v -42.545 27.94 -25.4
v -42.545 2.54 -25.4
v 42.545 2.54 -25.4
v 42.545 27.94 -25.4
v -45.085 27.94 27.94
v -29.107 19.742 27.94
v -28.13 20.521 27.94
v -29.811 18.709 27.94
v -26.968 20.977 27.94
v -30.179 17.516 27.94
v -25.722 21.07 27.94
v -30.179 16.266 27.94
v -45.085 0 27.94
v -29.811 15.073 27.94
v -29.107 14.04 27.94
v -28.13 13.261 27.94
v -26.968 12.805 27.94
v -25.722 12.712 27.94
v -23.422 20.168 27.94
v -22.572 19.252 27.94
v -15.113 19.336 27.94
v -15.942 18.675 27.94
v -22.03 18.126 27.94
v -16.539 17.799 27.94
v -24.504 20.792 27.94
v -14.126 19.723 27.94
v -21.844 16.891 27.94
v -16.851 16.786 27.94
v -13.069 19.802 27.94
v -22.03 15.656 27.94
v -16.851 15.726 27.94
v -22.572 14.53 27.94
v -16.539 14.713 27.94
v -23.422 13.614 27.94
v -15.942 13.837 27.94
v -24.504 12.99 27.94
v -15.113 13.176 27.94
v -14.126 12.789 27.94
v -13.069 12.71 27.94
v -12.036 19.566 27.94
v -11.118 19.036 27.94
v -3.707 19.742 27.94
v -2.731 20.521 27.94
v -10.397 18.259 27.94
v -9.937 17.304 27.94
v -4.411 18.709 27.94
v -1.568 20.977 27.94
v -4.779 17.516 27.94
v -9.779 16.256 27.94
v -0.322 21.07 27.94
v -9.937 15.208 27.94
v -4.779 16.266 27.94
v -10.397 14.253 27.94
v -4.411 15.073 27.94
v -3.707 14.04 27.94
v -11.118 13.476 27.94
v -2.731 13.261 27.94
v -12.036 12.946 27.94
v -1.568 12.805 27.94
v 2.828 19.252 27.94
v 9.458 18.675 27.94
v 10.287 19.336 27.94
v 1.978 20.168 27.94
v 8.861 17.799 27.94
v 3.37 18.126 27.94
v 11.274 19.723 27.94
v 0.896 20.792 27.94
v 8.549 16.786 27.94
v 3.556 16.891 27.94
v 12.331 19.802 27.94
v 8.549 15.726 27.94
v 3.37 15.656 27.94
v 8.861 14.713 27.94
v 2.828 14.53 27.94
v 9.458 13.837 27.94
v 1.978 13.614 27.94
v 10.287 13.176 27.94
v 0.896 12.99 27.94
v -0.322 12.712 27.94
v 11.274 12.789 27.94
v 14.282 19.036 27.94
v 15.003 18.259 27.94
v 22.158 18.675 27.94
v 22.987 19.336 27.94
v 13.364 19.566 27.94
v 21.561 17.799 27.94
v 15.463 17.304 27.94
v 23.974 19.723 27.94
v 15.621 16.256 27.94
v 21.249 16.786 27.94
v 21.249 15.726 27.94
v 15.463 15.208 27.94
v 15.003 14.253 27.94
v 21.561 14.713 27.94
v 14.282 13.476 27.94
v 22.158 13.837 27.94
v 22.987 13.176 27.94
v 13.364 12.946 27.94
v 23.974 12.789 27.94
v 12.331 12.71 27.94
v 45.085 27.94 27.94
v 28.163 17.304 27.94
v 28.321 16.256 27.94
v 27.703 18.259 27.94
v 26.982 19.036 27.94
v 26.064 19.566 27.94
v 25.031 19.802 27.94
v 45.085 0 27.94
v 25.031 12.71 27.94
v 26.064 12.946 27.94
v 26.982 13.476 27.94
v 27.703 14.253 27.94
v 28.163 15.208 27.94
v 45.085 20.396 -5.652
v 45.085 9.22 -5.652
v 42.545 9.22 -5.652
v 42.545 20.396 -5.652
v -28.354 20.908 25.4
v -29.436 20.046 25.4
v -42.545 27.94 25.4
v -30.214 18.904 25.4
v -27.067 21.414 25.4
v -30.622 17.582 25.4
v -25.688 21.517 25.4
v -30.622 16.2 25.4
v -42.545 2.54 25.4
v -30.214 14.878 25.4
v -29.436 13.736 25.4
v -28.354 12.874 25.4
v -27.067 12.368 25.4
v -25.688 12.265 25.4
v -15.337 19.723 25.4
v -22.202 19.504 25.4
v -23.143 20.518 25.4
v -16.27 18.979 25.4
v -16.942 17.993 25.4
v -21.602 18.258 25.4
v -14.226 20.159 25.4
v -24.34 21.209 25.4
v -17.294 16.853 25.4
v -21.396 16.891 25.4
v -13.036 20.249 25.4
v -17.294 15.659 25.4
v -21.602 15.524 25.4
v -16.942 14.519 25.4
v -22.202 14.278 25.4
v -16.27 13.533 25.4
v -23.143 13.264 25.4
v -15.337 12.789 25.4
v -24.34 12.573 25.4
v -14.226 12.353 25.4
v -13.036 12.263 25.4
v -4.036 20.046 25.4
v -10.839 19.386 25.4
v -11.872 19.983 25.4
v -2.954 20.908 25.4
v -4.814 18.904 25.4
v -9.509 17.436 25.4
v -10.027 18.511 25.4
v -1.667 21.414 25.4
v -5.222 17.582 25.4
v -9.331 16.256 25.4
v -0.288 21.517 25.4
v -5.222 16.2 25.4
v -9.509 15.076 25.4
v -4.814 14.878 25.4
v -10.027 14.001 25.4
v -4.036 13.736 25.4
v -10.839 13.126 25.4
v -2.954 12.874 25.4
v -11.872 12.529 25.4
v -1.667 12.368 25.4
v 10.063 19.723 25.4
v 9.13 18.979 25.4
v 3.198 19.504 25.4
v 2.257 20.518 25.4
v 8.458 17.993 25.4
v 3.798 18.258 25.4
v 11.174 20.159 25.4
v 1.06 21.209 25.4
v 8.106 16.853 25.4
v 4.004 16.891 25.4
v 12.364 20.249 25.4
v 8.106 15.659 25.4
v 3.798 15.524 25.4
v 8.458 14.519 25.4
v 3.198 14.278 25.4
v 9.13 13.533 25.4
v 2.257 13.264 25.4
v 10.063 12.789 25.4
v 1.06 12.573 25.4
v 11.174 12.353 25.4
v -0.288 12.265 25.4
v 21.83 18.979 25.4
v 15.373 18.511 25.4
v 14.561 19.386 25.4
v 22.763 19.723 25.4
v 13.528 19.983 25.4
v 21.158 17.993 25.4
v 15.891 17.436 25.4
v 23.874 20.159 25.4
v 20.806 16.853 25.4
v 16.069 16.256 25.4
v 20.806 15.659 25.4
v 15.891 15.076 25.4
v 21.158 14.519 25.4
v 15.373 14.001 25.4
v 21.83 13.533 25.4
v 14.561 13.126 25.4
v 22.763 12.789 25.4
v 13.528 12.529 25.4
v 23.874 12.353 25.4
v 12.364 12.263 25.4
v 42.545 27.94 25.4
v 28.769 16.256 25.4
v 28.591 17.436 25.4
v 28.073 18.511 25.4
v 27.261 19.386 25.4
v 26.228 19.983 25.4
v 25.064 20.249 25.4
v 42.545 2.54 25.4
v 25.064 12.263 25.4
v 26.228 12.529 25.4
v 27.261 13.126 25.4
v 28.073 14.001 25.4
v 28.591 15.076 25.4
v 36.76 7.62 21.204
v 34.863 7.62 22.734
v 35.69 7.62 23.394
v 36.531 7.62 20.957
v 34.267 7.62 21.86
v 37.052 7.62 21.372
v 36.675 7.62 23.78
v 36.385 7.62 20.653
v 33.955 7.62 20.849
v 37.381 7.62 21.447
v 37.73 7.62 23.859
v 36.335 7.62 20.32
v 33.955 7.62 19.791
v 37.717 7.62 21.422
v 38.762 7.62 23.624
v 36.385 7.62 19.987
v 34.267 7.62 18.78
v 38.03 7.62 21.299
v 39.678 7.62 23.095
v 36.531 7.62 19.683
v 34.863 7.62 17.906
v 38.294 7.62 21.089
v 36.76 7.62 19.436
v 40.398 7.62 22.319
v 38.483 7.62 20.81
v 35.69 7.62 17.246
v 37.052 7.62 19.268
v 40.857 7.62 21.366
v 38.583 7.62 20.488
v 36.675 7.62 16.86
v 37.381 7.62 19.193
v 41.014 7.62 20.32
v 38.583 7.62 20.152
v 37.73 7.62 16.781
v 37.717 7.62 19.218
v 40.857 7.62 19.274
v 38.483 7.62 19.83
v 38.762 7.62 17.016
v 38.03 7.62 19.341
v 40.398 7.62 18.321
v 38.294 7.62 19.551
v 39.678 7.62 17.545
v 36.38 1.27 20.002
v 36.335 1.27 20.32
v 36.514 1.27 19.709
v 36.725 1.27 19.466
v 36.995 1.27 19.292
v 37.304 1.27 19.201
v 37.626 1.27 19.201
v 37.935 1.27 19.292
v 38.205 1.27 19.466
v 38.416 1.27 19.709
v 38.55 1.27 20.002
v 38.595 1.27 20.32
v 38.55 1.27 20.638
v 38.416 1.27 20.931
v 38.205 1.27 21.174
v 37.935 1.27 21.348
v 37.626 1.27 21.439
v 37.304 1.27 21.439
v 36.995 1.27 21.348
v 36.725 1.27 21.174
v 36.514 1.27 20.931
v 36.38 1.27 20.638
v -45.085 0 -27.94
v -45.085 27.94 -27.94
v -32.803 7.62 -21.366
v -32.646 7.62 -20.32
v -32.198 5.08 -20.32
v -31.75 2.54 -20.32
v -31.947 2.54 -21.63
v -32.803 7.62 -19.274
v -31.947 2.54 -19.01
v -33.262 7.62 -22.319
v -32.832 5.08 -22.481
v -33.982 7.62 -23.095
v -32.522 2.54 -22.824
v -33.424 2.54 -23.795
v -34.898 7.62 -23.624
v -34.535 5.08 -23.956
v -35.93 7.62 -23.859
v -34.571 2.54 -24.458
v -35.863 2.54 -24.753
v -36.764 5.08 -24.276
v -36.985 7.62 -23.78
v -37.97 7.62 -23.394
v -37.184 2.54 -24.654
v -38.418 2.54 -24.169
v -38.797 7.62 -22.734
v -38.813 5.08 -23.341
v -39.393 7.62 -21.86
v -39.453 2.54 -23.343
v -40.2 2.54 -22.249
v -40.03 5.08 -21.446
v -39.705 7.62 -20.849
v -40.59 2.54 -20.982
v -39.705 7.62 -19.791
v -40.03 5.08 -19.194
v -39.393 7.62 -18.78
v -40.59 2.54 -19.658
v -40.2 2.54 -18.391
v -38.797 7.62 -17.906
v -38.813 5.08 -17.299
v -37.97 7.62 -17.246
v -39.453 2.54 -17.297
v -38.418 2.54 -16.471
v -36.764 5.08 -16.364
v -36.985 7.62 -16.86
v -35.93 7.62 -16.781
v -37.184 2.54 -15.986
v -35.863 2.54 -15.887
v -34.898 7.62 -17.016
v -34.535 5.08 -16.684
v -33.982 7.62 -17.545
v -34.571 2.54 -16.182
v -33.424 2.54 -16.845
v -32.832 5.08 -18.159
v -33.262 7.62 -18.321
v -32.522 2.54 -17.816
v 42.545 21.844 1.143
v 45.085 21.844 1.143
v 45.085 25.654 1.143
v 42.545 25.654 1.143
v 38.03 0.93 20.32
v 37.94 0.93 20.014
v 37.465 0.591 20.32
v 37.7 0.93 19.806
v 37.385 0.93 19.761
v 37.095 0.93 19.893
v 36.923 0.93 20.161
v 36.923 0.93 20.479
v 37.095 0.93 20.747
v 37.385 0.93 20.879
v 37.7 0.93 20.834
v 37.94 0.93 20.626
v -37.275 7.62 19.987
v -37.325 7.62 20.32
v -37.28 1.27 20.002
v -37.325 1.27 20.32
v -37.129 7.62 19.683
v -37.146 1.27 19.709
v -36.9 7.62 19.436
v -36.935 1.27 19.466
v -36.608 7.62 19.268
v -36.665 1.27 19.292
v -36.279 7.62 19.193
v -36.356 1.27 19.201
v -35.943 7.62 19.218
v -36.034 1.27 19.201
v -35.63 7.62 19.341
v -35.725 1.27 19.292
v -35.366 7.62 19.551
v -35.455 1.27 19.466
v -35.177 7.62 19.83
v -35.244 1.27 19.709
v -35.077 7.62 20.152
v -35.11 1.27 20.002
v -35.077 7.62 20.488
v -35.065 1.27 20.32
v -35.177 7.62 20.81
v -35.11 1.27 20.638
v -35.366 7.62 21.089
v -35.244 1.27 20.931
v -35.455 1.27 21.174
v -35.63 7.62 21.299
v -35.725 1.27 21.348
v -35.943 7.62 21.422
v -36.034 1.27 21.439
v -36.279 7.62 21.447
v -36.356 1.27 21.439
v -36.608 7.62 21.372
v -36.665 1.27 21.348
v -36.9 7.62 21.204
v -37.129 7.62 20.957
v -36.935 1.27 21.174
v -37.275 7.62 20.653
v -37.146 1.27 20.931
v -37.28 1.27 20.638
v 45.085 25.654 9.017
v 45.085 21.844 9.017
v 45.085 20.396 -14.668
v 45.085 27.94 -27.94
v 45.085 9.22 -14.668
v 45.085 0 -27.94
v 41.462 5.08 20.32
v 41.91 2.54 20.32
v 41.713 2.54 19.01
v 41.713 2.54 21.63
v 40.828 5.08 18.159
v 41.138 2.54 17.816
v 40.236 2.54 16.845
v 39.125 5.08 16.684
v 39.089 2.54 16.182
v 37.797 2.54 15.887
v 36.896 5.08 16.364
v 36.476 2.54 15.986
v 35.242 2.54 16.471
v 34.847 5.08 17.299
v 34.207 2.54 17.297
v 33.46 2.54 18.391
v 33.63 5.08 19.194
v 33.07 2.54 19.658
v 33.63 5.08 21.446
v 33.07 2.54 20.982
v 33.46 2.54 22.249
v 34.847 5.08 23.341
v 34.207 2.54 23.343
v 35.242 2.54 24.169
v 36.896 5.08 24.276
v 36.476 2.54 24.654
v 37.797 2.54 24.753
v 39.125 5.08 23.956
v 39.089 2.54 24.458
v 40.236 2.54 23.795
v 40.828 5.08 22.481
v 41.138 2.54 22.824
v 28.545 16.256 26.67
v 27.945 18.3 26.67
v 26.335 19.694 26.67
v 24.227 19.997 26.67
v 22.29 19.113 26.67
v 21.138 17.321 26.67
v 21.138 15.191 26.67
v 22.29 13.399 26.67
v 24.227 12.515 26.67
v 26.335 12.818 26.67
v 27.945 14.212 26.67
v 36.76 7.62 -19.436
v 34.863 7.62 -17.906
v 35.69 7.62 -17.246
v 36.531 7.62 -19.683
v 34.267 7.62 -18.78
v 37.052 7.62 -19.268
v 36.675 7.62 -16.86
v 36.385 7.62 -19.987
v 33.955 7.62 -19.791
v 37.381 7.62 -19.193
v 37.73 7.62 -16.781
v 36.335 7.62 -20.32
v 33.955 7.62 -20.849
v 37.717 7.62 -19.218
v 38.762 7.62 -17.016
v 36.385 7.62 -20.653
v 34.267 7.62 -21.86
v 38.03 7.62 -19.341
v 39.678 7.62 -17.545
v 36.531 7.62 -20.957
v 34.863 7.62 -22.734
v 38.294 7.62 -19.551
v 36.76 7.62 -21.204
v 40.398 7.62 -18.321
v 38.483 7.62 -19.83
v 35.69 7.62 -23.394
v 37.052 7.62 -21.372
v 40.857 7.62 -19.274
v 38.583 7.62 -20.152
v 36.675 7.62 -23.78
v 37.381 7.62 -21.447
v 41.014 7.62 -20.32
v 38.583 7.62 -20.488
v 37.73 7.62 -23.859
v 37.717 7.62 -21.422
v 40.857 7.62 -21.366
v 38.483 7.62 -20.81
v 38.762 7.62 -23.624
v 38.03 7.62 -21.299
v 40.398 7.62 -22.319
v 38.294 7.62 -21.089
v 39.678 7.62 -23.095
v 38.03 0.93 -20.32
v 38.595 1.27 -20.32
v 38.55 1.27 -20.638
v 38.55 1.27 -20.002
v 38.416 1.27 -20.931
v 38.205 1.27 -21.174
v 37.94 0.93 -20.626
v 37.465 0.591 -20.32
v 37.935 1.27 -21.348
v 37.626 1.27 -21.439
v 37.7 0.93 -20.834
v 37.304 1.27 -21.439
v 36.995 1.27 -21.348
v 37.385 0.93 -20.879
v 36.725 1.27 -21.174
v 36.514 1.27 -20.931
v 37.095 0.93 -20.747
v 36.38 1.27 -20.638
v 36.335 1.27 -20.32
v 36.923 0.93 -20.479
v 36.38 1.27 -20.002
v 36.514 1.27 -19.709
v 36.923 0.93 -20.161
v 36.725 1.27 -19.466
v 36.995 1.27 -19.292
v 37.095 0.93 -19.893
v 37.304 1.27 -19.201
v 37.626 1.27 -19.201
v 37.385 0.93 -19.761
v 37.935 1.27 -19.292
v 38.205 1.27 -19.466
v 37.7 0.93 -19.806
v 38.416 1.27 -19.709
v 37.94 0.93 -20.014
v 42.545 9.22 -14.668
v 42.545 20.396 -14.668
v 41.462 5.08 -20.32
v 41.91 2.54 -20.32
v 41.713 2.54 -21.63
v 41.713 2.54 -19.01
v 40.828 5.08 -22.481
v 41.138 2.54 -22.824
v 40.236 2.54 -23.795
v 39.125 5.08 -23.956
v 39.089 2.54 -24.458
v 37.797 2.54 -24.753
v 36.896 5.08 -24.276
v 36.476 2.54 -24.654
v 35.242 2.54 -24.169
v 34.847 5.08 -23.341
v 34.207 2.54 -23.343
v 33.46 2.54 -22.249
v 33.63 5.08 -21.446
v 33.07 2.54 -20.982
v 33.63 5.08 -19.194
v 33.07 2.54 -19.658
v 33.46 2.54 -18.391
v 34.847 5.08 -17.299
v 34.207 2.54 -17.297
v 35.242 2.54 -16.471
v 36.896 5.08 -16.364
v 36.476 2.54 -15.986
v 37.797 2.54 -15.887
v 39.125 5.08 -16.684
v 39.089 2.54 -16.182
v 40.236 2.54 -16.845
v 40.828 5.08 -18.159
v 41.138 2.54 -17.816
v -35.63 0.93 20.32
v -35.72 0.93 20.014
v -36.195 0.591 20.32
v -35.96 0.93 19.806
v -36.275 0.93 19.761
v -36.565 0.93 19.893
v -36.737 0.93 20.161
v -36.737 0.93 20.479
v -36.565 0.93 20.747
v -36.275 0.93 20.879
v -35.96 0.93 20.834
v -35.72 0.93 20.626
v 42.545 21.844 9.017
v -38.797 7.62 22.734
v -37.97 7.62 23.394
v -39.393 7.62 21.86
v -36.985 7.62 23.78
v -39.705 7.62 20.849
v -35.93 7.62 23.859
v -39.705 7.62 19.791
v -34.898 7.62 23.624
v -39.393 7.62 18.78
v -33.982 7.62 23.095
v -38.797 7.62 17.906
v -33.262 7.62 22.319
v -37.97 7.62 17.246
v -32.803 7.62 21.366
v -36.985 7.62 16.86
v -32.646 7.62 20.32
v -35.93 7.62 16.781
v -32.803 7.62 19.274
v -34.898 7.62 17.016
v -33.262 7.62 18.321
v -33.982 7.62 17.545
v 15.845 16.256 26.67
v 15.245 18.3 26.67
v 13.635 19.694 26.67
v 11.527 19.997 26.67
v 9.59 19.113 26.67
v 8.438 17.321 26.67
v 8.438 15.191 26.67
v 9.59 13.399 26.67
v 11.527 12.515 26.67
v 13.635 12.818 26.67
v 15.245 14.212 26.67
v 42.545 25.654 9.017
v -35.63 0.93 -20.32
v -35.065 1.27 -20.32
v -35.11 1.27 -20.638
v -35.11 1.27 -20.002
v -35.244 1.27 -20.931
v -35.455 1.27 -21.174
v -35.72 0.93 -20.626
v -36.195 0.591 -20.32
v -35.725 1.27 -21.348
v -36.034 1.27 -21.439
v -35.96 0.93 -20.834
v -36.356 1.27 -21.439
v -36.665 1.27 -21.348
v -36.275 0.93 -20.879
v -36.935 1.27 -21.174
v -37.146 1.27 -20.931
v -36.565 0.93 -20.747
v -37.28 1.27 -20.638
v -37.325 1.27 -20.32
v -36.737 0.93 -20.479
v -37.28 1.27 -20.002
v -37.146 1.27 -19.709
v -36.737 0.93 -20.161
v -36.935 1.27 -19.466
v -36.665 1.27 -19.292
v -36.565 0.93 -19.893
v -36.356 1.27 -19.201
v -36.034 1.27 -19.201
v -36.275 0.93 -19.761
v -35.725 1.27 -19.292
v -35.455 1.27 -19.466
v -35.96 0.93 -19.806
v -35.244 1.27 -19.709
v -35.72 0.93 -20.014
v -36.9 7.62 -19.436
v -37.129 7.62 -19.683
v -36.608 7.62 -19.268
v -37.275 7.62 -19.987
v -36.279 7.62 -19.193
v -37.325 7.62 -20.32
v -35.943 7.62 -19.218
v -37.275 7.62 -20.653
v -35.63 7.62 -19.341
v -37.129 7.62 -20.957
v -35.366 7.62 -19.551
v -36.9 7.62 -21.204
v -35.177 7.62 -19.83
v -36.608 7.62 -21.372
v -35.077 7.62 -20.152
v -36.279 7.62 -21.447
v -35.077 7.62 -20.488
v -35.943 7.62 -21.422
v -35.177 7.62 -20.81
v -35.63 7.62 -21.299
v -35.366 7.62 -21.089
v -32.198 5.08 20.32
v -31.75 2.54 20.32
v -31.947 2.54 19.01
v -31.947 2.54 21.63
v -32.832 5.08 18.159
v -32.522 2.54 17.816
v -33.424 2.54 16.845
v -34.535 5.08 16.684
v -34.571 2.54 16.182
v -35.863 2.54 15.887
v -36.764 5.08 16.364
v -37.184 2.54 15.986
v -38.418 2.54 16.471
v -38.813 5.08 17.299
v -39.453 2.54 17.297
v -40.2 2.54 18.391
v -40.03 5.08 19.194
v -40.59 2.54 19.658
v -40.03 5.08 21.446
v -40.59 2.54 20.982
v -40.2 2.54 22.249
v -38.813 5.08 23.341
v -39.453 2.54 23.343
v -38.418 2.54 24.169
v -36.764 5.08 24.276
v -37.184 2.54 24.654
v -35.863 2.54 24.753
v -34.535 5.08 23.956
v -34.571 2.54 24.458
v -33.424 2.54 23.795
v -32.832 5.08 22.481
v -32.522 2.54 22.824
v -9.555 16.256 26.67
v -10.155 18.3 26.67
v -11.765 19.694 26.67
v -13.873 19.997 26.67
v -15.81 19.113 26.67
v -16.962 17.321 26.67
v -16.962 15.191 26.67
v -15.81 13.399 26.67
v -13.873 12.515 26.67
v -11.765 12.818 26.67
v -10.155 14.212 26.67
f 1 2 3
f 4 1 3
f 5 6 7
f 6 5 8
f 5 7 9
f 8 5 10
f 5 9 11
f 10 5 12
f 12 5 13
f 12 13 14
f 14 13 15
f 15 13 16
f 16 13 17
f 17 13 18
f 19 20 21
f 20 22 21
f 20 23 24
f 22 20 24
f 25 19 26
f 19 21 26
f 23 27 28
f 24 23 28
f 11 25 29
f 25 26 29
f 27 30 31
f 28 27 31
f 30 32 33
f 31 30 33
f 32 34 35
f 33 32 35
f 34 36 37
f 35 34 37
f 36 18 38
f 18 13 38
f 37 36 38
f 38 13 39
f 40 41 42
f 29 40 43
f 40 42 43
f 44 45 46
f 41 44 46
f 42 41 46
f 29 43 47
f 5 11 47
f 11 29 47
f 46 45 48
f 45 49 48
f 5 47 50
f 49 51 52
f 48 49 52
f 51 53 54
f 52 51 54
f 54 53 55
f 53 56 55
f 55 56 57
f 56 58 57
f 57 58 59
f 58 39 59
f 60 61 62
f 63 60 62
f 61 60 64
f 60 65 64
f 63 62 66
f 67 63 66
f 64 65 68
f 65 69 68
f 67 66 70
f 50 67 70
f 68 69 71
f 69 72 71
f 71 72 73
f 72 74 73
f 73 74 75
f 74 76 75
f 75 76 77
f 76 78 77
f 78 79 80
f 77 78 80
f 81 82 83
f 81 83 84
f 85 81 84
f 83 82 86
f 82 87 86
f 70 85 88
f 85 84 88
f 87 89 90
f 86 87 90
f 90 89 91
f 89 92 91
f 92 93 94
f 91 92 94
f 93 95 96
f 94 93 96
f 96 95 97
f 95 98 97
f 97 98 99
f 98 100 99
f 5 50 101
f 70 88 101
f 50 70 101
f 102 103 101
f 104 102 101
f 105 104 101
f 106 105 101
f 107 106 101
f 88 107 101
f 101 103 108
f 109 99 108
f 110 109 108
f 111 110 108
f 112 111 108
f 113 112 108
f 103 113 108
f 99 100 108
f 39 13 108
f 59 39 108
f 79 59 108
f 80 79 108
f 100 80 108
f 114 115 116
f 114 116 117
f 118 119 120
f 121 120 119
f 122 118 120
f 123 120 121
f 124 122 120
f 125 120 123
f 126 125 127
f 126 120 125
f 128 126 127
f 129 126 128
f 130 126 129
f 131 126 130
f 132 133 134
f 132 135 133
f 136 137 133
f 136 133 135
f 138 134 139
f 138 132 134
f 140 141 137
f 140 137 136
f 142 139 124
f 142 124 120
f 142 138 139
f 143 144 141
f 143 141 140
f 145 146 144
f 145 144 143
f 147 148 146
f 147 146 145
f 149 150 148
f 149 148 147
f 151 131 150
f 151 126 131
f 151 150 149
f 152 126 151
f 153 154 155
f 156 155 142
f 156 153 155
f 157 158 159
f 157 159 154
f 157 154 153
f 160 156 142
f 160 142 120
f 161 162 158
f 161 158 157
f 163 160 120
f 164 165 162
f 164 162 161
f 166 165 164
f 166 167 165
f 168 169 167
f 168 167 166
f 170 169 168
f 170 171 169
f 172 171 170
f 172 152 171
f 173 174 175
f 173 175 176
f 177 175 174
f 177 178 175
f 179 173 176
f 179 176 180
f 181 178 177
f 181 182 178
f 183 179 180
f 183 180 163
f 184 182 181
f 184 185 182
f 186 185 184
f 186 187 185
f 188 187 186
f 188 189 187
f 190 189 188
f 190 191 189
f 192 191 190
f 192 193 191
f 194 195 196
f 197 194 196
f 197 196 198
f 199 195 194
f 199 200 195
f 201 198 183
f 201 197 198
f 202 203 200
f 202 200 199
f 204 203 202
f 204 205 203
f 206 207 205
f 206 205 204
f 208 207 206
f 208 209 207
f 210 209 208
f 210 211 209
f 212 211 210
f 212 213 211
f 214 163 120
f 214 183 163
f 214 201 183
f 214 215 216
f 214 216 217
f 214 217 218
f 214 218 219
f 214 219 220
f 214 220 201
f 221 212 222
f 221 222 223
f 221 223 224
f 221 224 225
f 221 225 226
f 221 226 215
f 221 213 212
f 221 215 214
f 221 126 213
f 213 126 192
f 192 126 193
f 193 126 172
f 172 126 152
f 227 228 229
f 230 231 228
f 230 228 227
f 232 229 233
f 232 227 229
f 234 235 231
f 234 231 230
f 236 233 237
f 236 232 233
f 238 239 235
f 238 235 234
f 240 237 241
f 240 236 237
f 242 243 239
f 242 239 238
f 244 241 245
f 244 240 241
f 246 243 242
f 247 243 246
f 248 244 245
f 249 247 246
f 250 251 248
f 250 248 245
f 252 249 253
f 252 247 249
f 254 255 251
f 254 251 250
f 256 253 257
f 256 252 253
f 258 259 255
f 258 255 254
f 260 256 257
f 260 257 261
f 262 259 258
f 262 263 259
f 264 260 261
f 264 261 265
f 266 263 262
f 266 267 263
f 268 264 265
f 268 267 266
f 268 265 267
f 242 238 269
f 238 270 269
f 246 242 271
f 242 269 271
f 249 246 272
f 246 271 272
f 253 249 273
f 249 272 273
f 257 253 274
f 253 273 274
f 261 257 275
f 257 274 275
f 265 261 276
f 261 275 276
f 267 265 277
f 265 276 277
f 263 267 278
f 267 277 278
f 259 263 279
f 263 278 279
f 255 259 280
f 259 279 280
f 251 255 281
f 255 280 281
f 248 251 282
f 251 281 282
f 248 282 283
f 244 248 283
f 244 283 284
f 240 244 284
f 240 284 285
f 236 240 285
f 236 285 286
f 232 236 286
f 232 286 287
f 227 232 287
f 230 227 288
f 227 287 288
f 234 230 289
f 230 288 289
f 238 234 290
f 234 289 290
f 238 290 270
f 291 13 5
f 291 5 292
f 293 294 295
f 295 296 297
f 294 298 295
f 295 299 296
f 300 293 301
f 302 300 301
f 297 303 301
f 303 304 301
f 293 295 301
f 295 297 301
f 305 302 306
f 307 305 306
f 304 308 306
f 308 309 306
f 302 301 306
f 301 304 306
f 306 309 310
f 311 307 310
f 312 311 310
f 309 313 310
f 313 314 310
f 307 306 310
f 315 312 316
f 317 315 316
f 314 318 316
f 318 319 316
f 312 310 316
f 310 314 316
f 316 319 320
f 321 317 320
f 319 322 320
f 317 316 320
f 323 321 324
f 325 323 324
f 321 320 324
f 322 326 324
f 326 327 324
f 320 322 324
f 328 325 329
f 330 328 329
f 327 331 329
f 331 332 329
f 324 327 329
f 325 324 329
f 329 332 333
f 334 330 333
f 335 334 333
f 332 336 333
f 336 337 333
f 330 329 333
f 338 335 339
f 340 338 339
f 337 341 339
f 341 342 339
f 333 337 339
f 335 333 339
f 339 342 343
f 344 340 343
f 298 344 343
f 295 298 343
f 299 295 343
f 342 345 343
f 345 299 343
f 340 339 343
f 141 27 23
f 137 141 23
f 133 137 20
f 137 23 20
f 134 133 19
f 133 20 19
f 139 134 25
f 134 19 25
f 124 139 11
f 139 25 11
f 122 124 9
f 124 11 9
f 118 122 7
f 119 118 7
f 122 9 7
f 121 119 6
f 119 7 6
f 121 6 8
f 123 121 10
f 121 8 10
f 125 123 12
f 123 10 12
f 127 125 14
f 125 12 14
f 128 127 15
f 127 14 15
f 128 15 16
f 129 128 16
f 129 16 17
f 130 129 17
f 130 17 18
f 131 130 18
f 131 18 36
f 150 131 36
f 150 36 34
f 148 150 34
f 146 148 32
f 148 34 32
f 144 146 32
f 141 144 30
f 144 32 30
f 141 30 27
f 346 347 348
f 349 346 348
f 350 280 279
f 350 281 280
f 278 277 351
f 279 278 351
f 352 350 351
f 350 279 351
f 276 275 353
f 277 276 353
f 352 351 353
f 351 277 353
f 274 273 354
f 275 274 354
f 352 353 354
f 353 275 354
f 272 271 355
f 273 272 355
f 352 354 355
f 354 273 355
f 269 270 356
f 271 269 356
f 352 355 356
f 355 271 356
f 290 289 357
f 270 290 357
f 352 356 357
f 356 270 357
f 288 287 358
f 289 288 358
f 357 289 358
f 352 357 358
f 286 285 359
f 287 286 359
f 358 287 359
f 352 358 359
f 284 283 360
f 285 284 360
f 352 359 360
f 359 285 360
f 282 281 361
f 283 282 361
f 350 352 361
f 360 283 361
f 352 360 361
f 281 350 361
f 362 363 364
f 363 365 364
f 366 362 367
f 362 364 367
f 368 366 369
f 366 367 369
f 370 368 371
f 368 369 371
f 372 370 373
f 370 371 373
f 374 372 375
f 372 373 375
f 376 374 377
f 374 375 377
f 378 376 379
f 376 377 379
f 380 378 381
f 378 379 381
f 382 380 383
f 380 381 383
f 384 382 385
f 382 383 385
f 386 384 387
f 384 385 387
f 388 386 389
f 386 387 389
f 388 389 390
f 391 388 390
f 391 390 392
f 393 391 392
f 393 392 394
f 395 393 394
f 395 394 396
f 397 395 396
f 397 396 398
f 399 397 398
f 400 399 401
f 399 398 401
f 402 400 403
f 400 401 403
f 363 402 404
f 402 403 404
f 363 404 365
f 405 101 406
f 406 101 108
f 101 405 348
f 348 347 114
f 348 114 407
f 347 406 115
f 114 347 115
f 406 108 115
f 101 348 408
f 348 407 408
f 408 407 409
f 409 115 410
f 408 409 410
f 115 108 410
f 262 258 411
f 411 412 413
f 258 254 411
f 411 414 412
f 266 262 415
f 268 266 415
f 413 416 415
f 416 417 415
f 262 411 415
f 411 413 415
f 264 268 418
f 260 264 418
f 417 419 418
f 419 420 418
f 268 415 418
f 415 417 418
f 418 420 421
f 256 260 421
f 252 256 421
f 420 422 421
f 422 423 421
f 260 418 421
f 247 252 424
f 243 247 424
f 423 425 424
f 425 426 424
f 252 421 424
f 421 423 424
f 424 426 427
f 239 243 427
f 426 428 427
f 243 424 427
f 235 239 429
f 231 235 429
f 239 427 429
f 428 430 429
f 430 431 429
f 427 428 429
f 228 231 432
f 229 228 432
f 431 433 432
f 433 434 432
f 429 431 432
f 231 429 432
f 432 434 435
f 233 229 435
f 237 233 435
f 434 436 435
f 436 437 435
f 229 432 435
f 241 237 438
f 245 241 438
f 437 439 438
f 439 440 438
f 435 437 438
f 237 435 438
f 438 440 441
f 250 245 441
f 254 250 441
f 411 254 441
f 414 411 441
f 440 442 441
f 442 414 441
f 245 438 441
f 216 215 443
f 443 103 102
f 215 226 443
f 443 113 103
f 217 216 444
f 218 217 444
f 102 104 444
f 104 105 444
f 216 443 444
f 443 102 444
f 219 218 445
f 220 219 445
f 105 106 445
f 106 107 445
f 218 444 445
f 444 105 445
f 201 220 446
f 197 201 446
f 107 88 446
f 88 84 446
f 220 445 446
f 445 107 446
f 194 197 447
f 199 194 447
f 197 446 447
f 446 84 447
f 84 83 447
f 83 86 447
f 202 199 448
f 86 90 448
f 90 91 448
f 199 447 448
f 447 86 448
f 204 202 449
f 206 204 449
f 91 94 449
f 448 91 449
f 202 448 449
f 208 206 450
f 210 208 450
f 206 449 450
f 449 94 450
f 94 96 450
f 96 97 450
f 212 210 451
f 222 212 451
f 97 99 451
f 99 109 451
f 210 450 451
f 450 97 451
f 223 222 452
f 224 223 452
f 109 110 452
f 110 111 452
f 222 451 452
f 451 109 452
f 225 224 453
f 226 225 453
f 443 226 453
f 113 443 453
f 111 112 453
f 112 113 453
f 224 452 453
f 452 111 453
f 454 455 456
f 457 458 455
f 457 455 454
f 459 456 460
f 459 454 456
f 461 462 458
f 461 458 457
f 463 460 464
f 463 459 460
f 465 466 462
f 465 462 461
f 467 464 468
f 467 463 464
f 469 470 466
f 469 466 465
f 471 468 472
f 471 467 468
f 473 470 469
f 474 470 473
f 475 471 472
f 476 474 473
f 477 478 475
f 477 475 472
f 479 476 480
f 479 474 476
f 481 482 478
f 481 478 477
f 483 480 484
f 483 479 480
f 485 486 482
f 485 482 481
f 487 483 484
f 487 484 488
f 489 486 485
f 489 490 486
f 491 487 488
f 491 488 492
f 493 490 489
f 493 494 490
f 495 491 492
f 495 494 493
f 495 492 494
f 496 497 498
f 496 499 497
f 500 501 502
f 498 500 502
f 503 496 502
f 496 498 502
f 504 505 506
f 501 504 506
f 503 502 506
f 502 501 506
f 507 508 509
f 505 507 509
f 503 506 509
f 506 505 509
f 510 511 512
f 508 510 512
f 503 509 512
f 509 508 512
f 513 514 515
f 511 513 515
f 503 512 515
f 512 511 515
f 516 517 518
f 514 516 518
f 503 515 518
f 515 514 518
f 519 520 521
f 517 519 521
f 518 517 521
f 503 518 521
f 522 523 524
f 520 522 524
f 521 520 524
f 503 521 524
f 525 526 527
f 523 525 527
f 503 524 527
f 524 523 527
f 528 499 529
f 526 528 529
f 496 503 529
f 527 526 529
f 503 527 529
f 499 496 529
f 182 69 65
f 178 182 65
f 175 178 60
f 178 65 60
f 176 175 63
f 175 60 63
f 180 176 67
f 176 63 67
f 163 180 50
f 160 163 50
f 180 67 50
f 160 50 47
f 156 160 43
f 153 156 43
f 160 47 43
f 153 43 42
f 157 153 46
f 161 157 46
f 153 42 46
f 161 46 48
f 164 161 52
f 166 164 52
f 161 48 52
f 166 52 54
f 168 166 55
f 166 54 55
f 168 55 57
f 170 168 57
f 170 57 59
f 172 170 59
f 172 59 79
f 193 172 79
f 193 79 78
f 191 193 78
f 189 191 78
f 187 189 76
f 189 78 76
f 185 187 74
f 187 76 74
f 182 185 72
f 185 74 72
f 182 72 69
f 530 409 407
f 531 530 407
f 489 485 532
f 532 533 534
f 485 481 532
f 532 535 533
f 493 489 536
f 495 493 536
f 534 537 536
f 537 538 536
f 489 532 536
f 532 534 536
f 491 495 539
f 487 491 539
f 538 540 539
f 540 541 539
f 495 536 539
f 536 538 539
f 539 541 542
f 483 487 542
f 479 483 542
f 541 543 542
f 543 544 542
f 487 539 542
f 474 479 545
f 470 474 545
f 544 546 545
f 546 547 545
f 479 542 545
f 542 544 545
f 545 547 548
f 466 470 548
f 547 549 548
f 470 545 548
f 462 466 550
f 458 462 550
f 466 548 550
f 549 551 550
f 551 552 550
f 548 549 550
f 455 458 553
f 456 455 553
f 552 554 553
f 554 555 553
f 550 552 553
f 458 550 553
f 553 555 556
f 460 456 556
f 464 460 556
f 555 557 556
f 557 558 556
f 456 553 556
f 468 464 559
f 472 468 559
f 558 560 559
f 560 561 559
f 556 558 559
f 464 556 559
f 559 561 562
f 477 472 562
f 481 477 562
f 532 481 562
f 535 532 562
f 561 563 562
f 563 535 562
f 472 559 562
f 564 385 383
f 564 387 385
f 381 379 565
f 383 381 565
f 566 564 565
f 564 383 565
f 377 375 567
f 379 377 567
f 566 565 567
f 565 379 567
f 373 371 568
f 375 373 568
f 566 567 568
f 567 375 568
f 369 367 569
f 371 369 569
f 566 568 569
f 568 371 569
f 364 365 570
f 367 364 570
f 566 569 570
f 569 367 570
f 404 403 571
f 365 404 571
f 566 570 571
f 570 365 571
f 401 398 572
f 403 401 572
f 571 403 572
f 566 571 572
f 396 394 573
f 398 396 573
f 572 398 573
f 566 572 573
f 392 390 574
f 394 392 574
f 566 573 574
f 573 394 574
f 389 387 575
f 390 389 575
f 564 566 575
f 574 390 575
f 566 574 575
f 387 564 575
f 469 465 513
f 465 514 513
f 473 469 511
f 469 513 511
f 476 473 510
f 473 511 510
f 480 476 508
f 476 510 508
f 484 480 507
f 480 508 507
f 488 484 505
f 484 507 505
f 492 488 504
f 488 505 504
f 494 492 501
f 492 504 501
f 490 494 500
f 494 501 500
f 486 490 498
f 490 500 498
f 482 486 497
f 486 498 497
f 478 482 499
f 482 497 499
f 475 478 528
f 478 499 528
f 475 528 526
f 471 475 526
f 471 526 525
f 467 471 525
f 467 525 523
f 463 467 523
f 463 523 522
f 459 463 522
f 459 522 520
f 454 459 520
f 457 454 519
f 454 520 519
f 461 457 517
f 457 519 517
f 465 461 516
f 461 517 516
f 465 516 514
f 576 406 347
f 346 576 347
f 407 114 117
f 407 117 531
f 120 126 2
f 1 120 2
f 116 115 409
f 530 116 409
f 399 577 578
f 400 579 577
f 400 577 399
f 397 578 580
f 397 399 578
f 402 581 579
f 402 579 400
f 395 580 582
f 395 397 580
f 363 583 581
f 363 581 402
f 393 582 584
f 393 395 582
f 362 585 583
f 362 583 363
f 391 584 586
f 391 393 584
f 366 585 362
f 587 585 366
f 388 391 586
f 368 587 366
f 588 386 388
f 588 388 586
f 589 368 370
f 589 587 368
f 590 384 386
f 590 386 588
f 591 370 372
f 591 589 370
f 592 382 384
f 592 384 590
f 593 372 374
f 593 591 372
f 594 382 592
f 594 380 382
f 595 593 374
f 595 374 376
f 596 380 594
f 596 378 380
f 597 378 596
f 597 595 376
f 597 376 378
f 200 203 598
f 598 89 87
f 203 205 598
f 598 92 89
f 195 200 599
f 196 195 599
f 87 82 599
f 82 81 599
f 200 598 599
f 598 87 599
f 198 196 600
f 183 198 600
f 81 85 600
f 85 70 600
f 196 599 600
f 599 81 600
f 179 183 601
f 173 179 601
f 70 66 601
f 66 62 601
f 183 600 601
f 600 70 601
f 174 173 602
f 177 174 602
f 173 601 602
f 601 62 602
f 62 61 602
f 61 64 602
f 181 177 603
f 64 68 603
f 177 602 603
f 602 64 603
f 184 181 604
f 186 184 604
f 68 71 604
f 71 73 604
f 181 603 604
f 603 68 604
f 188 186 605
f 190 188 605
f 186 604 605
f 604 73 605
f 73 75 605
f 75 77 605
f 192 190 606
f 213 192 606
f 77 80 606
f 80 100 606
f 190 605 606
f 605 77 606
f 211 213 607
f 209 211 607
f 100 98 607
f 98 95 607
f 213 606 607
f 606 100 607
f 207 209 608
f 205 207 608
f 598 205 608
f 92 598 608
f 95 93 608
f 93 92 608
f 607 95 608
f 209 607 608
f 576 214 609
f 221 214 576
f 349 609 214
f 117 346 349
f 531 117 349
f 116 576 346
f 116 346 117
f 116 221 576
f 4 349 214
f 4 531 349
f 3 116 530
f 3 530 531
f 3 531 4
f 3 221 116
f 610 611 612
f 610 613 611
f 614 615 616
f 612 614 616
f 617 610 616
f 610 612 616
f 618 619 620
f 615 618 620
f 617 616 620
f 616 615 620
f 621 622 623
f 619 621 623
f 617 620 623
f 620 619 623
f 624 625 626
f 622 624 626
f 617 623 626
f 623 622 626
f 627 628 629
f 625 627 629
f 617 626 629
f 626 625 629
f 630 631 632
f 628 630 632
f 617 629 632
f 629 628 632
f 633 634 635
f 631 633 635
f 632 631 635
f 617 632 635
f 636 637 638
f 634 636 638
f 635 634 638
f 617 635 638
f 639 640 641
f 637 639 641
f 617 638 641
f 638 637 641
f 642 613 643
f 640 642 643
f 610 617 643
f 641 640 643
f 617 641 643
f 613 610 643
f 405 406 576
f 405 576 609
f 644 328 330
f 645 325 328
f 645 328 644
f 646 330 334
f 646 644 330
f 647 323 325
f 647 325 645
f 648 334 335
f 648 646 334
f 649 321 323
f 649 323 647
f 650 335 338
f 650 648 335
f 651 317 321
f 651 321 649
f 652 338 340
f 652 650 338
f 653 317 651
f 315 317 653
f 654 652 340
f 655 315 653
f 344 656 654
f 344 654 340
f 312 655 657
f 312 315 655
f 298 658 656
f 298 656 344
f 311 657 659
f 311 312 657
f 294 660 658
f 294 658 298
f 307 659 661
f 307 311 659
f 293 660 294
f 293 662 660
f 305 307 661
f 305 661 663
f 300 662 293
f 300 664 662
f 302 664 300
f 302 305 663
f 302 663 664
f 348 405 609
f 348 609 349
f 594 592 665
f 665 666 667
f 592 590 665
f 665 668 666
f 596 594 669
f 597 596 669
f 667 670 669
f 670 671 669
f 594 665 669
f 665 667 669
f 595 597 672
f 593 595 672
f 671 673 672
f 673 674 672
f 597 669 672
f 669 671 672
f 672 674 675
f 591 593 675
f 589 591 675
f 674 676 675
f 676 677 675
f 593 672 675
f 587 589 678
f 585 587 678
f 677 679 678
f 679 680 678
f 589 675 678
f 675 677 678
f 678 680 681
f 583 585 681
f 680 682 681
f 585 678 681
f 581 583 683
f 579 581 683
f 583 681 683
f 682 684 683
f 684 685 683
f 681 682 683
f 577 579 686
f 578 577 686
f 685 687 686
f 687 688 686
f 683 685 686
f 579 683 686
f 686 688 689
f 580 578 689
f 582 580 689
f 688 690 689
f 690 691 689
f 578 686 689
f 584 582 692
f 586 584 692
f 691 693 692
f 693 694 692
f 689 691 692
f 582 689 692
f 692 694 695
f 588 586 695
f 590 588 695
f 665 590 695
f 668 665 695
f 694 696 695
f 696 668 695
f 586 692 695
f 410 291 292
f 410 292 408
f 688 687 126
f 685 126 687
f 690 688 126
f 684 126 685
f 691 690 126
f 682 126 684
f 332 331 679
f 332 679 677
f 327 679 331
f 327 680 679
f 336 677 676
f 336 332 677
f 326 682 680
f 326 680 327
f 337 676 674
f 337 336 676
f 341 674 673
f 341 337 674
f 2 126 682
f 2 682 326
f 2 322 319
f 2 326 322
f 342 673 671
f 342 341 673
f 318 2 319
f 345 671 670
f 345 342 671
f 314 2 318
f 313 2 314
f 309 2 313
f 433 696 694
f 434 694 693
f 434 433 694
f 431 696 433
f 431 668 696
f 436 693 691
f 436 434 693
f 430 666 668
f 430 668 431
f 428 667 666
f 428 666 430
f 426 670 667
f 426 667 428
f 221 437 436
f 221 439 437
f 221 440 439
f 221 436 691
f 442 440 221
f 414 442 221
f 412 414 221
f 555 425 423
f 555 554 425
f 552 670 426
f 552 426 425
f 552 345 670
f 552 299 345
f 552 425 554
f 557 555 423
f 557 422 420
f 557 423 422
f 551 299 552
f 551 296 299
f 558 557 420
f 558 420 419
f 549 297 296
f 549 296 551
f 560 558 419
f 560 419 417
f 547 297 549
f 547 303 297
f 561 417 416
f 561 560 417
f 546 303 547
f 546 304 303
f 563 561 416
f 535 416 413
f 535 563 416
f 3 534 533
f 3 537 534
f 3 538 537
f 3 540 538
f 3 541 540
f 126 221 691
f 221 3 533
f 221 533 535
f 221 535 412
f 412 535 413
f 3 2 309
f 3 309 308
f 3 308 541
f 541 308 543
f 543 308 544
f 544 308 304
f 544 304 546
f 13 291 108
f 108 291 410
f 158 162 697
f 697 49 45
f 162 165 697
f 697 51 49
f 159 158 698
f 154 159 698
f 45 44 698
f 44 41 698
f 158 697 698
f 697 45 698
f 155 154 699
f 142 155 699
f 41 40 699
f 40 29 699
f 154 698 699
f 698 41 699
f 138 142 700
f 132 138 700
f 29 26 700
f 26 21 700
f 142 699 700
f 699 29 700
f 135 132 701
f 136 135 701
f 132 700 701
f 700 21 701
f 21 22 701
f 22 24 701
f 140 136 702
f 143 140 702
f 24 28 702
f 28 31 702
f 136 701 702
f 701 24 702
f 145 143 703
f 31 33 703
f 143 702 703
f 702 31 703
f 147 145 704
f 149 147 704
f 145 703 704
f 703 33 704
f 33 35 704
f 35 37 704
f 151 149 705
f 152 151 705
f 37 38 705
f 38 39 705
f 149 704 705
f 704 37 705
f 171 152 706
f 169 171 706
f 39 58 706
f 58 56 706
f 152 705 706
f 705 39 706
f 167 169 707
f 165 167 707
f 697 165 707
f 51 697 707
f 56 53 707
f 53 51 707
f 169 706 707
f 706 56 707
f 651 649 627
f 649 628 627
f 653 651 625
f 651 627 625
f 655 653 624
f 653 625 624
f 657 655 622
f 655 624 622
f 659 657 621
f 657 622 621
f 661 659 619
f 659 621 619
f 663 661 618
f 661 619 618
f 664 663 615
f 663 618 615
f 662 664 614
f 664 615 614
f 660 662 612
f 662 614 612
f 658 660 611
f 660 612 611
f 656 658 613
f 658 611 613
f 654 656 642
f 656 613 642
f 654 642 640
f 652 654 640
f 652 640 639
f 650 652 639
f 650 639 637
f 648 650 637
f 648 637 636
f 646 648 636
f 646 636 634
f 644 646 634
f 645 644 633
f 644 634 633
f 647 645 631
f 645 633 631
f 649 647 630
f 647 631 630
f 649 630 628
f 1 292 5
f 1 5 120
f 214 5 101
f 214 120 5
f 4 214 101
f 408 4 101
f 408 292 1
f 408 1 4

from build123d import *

# Parameters (mm, degrees)
SKETCH1_W                     = 90.17
SKETCH1_H                     = 55.88
BOSS_EXTRUDE1_DEPTH           = 27.94
SHELL1_T                      = -2.54
SKETCH2_R                     = 4.445
BOSS_EXTRUDE4_DEPTH           = 5.08
BOSS_EXTRUDE4_DRAFT           = 10
BOSS_EXTRUDE4_PROFILE_2_DEPTH = 5.08
BOSS_EXTRUDE4_PROFILE_2_DRAFT = 10
BOSS_EXTRUDE4_PROFILE_3_DEPTH = 5.08
BOSS_EXTRUDE4_PROFILE_3_DRAFT = 10
BOSS_EXTRUDE4_PROFILE_4_DEPTH = 5.08
BOSS_EXTRUDE4_PROFILE_4_DRAFT = 10
TAP_DRILL_FOR_4_40_TAP1_D     = 2.2606
TAP_DRILL_FOR_4_40_TAP1_DEPTH = 6.35
TAP_DRILL_FOR_4_40_TAP1_TIP   = 0.679152758
SKETCH6_R                     = 3.556
CUT_EXTRUDE1_DEPTH            = 2.54
CUT_EXTRUDE1_DRAFT            = 10
CUT_EXTRUDE1_PROFILE_2_DEPTH  = 2.54
CUT_EXTRUDE1_PROFILE_2_DRAFT  = 10
CUT_EXTRUDE1_PROFILE_3_DEPTH  = 2.54
CUT_EXTRUDE1_PROFILE_3_DRAFT  = 10
SKETCH6_R_2                   = 4.191
CUT_EXTRUDE1_PROFILE_4_DEPTH  = 2.54
CUT_EXTRUDE1_PROFILE_4_DRAFT  = 10
CUT_EXTRUDE1_PROFILE_5_DEPTH  = 2.54
CUT_EXTRUDE1_PROFILE_5_DRAFT  = 10
CUT_EXTRUDE2_REACH            = 100.448
SKETCH7_W                     = 9.017
SKETCH7_H                     = 11.176
SKETCH7_W_2                   = 7.874
SKETCH7_H_2                   = 3.81


with BuildPart() as part:
    # Sketch1 → Boss-Extrude1 (new body)
    with BuildSketch(Plane(origin=(0, 0, 0), x_dir=(1, 0, 0), z_dir=(0, 1, 0))):
        Rectangle(SKETCH1_W, SKETCH1_H)
    extrude(amount=BOSS_EXTRUDE1_DEPTH)

    # Shell1
    shell1_openings = [part.faces().sort_by_distance(p)[0] for p in [
        (0, 27.94, 0),
    ]]
    offset(amount=SHELL1_T, openings=shell1_openings, kind=Kind.INTERSECTION)


with BuildPart() as boss_extrude4_tool:
    # Sketch2 → Boss-Extrude4 (with draft: the straight prism first)
    with BuildSketch(Plane(origin=(0, 2.54, 0), x_dir=(1, 0, 0), z_dir=(0, 1, 0))):
        with Locations((37.465, 20.32)):
            Circle(SKETCH2_R)
    extrude(amount=BOSS_EXTRUDE4_DEPTH)
    # Boss-Extrude4: the draft: its side faces are tilted about the plane it starts from
    boss_extrude4_sides = [boss_extrude4_tool.faces().sort_by_distance(p)[0] for p in [
        (33.02, 5.08, -20.32),
    ]]
    draft(boss_extrude4_sides, Plane(origin=(0, 2.54, 0), x_dir=(1, 0, 0), z_dir=(0, 1, 0)), BOSS_EXTRUDE4_DRAFT)


with BuildPart() as part_1:
    add(part.part)

    # Boss-Extrude4: add boss_extrude4_tool
    add(boss_extrude4_tool.part)


with BuildPart() as boss_extrude4_profile_2_tool:
    # Sketch2 → Boss-Extrude4 profile 2 (with draft: the straight prism first)
    with BuildSketch(Plane(origin=(0, 2.54, 0), x_dir=(1, 0, 0), z_dir=(0, 1, 0))):
        with Locations((37.465, -20.32)):
            Circle(SKETCH2_R)
    extrude(amount=BOSS_EXTRUDE4_PROFILE_2_DEPTH)
    # Boss-Extrude4 profile 2: the draft: its side faces are tilted about the plane it starts from
    boss_extrude4_profile_2_sides = [boss_extrude4_profile_2_tool.faces().sort_by_distance(p)[0] for p in [
        (33.02, 5.08, 20.32),
    ]]
    draft(boss_extrude4_profile_2_sides, Plane(origin=(0, 2.54, 0), x_dir=(1, 0, 0), z_dir=(0, 1, 0)), BOSS_EXTRUDE4_PROFILE_2_DRAFT)


with BuildPart() as part_2:
    add(part_1.part)

    # Boss-Extrude4 profile 2: add boss_extrude4_profile_2_tool
    add(boss_extrude4_profile_2_tool.part)


with BuildPart() as boss_extrude4_profile_3_tool:
    # Sketch2 → Boss-Extrude4 profile 3 (with draft: the straight prism first)
    with BuildSketch(Plane(origin=(0, 2.54, 0), x_dir=(1, 0, 0), z_dir=(0, 1, 0))):
        with Locations((-36.195, -20.32)):
            Circle(SKETCH2_R)
    extrude(amount=BOSS_EXTRUDE4_PROFILE_3_DEPTH)
    # Boss-Extrude4 profile 3: the draft: its side faces are tilted about the plane it starts from
    boss_extrude4_profile_3_sides = [boss_extrude4_profile_3_tool.faces().sort_by_distance(p)[0] for p in [
        (-40.64, 5.08, 20.32),
    ]]
    draft(boss_extrude4_profile_3_sides, Plane(origin=(0, 2.54, 0), x_dir=(1, 0, 0), z_dir=(0, 1, 0)), BOSS_EXTRUDE4_PROFILE_3_DRAFT)


with BuildPart() as part_3:
    add(part_2.part)

    # Boss-Extrude4 profile 3: add boss_extrude4_profile_3_tool
    add(boss_extrude4_profile_3_tool.part)


with BuildPart() as boss_extrude4_profile_4_tool:
    # Sketch2 → Boss-Extrude4 profile 4 (with draft: the straight prism first)
    with BuildSketch(Plane(origin=(0, 2.54, 0), x_dir=(1, 0, 0), z_dir=(0, 1, 0))):
        with Locations((-36.195, 20.32)):
            Circle(SKETCH2_R)
    extrude(amount=BOSS_EXTRUDE4_PROFILE_4_DEPTH)
    # Boss-Extrude4 profile 4: the draft: its side faces are tilted about the plane it starts from
    boss_extrude4_profile_4_sides = [boss_extrude4_profile_4_tool.faces().sort_by_distance(p)[0] for p in [
        (-40.64, 5.08, -20.32),
    ]]
    draft(boss_extrude4_profile_4_sides, Plane(origin=(0, 2.54, 0), x_dir=(1, 0, 0), z_dir=(0, 1, 0)), BOSS_EXTRUDE4_PROFILE_4_DRAFT)


with BuildPart() as part_4:
    add(part_3.part)

    # Boss-Extrude4 profile 4: add boss_extrude4_profile_4_tool
    add(boss_extrude4_profile_4_tool.part)

    # Tap Drill for #4-40 Tap1
    with Locations(Plane(origin=(0, 7.62, 0), x_dir=(1, 0, 0), z_dir=(0, 1, 0))):
        with Locations((-36.195, 20.32), (-36.195, -20.32), (37.465, -20.32), (37.465, 20.32)):
            Hole(TAP_DRILL_FOR_4_40_TAP1_D / 2, depth=TAP_DRILL_FOR_4_40_TAP1_DEPTH)
            with Locations((0, 0, -(TAP_DRILL_FOR_4_40_TAP1_DEPTH + TAP_DRILL_FOR_4_40_TAP1_TIP / 2))):  # 118° drill point
                Cone(0, TAP_DRILL_FOR_4_40_TAP1_D / 2, TAP_DRILL_FOR_4_40_TAP1_TIP, mode=Mode.SUBTRACT)


with BuildPart() as cut_extrude1_tool:
    # Sketch6 → Cut-Extrude1 (with draft: the straight prism first)
    with BuildSketch(Plane.XY.offset(27.94)):
        with Locations((24.765, 16.256)):
            Circle(SKETCH6_R)
    extrude(amount=-CUT_EXTRUDE1_DEPTH)
    # Cut-Extrude1: the draft: its side faces are tilted about the plane it starts from
    cut_extrude1_sides = [cut_extrude1_tool.faces().sort_by_distance(p)[0] for p in [
        (21.209, 16.256, 26.67),
    ]]
    draft(cut_extrude1_sides, Plane.XY.offset(27.94), CUT_EXTRUDE1_DRAFT)


with BuildPart() as part_5:
    add(part_4.part)

    # Cut-Extrude1: cut by cut_extrude1_tool
    add(cut_extrude1_tool.part, mode=Mode.SUBTRACT)


with BuildPart() as cut_extrude1_profile_2_tool:
    # Sketch6 → Cut-Extrude1 profile 2 (with draft: the straight prism first)
    with BuildSketch(Plane.XY.offset(27.94)):
        with Locations((12.065, 16.256)):
            Circle(SKETCH6_R)
    extrude(amount=-CUT_EXTRUDE1_PROFILE_2_DEPTH)
    # Cut-Extrude1 profile 2: the draft: its side faces are tilted about the plane it starts from
    cut_extrude1_profile_2_sides = [cut_extrude1_profile_2_tool.faces().sort_by_distance(p)[0] for p in [
        (8.509, 16.256, 26.67),
    ]]
    draft(cut_extrude1_profile_2_sides, Plane.XY.offset(27.94), CUT_EXTRUDE1_PROFILE_2_DRAFT)


with BuildPart() as part_6:
    add(part_5.part)

    # Cut-Extrude1 profile 2: cut by cut_extrude1_profile_2_tool
    add(cut_extrude1_profile_2_tool.part, mode=Mode.SUBTRACT)


with BuildPart() as cut_extrude1_profile_3_tool:
    # Sketch6 → Cut-Extrude1 profile 3 (with draft: the straight prism first)
    with BuildSketch(Plane.XY.offset(27.94)):
        with Locations((-13.335, 16.256)):
            Circle(SKETCH6_R)
    extrude(amount=-CUT_EXTRUDE1_PROFILE_3_DEPTH)
    # Cut-Extrude1 profile 3: the draft: its side faces are tilted about the plane it starts from
    cut_extrude1_profile_3_sides = [cut_extrude1_profile_3_tool.faces().sort_by_distance(p)[0] for p in [
        (-16.891, 16.256, 26.67),
    ]]
    draft(cut_extrude1_profile_3_sides, Plane.XY.offset(27.94), CUT_EXTRUDE1_PROFILE_3_DRAFT)


with BuildPart() as part_7:
    add(part_6.part)

    # Cut-Extrude1 profile 3: cut by cut_extrude1_profile_3_tool
    add(cut_extrude1_profile_3_tool.part, mode=Mode.SUBTRACT)


with BuildPart() as cut_extrude1_profile_4_tool:
    # Sketch6 → Cut-Extrude1 profile 4 (with draft: the straight prism first)
    with BuildSketch(Plane.XY.offset(27.94)):
        with Locations((-0.635, 16.891)):
            Circle(SKETCH6_R_2)
    extrude(amount=-CUT_EXTRUDE1_PROFILE_4_DEPTH)
    # Cut-Extrude1 profile 4: the draft: its side faces are tilted about the plane it starts from
    cut_extrude1_profile_4_sides = [cut_extrude1_profile_4_tool.faces().sort_by_distance(p)[0] for p in [
        (-4.826, 16.891, 26.67),
    ]]
    draft(cut_extrude1_profile_4_sides, Plane.XY.offset(27.94), CUT_EXTRUDE1_PROFILE_4_DRAFT)


with BuildPart() as part_8:
    add(part_7.part)

    # Cut-Extrude1 profile 4: cut by cut_extrude1_profile_4_tool
    add(cut_extrude1_profile_4_tool.part, mode=Mode.SUBTRACT)


with BuildPart() as cut_extrude1_profile_5_tool:
    # Sketch6 → Cut-Extrude1 profile 5 (with draft: the straight prism first)
    with BuildSketch(Plane.XY.offset(27.94)):
        with Locations((-26.035, 16.891)):
            Circle(SKETCH6_R_2)
    extrude(amount=-CUT_EXTRUDE1_PROFILE_5_DEPTH)
    # Cut-Extrude1 profile 5: the draft: its side faces are tilted about the plane it starts from
    cut_extrude1_profile_5_sides = [cut_extrude1_profile_5_tool.faces().sort_by_distance(p)[0] for p in [
        (-30.226, 16.891, 26.67),
    ]]
    draft(cut_extrude1_profile_5_sides, Plane.XY.offset(27.94), CUT_EXTRUDE1_PROFILE_5_DRAFT)


with BuildPart() as part_9:
    add(part_8.part)

    # Cut-Extrude1 profile 5: cut by cut_extrude1_profile_5_tool
    add(cut_extrude1_profile_5_tool.part, mode=Mode.SUBTRACT)

    # Sketch7 → Cut-Extrude2 (cut, up to next)
    with BuildSketch(Plane(origin=(45.085, 0, 0), x_dir=(0, 0, -1), z_dir=(1, 0, 0)), mode=Mode.PRIVATE) as cut_extrude2_sk1:
        with Locations((10.16, 14.8082)):
            Rectangle(SKETCH7_W, SKETCH7_H)
    cut_extrude2_tool1 = extrude(cut_extrude2_sk1.sketch, amount=-CUT_EXTRUDE2_REACH, mode=Mode.PRIVATE) & part_9.part
    # Sketch7 → Cut-Extrude2 (cut, up to next)
    with BuildSketch(Plane(origin=(45.085, 0, 0), x_dir=(0, 0, -1), z_dir=(1, 0, 0)), mode=Mode.PRIVATE) as cut_extrude2_sk2:
        with Locations((-5.08, 23.749)):
            Rectangle(SKETCH7_W_2, SKETCH7_H_2)
    cut_extrude2_tool2 = extrude(cut_extrude2_sk2.sketch, amount=-CUT_EXTRUDE2_REACH, mode=Mode.PRIVATE) & part_9.part
    add(cut_extrude2_tool1.solids().sort_by_distance((45.085, 14.8082, -10.16))[0], mode=Mode.SUBTRACT)
    add(cut_extrude2_tool2.solids().sort_by_distance((45.085, 23.749, 5.08))[0], mode=Mode.SUBTRACT)


solid = part_9.part
